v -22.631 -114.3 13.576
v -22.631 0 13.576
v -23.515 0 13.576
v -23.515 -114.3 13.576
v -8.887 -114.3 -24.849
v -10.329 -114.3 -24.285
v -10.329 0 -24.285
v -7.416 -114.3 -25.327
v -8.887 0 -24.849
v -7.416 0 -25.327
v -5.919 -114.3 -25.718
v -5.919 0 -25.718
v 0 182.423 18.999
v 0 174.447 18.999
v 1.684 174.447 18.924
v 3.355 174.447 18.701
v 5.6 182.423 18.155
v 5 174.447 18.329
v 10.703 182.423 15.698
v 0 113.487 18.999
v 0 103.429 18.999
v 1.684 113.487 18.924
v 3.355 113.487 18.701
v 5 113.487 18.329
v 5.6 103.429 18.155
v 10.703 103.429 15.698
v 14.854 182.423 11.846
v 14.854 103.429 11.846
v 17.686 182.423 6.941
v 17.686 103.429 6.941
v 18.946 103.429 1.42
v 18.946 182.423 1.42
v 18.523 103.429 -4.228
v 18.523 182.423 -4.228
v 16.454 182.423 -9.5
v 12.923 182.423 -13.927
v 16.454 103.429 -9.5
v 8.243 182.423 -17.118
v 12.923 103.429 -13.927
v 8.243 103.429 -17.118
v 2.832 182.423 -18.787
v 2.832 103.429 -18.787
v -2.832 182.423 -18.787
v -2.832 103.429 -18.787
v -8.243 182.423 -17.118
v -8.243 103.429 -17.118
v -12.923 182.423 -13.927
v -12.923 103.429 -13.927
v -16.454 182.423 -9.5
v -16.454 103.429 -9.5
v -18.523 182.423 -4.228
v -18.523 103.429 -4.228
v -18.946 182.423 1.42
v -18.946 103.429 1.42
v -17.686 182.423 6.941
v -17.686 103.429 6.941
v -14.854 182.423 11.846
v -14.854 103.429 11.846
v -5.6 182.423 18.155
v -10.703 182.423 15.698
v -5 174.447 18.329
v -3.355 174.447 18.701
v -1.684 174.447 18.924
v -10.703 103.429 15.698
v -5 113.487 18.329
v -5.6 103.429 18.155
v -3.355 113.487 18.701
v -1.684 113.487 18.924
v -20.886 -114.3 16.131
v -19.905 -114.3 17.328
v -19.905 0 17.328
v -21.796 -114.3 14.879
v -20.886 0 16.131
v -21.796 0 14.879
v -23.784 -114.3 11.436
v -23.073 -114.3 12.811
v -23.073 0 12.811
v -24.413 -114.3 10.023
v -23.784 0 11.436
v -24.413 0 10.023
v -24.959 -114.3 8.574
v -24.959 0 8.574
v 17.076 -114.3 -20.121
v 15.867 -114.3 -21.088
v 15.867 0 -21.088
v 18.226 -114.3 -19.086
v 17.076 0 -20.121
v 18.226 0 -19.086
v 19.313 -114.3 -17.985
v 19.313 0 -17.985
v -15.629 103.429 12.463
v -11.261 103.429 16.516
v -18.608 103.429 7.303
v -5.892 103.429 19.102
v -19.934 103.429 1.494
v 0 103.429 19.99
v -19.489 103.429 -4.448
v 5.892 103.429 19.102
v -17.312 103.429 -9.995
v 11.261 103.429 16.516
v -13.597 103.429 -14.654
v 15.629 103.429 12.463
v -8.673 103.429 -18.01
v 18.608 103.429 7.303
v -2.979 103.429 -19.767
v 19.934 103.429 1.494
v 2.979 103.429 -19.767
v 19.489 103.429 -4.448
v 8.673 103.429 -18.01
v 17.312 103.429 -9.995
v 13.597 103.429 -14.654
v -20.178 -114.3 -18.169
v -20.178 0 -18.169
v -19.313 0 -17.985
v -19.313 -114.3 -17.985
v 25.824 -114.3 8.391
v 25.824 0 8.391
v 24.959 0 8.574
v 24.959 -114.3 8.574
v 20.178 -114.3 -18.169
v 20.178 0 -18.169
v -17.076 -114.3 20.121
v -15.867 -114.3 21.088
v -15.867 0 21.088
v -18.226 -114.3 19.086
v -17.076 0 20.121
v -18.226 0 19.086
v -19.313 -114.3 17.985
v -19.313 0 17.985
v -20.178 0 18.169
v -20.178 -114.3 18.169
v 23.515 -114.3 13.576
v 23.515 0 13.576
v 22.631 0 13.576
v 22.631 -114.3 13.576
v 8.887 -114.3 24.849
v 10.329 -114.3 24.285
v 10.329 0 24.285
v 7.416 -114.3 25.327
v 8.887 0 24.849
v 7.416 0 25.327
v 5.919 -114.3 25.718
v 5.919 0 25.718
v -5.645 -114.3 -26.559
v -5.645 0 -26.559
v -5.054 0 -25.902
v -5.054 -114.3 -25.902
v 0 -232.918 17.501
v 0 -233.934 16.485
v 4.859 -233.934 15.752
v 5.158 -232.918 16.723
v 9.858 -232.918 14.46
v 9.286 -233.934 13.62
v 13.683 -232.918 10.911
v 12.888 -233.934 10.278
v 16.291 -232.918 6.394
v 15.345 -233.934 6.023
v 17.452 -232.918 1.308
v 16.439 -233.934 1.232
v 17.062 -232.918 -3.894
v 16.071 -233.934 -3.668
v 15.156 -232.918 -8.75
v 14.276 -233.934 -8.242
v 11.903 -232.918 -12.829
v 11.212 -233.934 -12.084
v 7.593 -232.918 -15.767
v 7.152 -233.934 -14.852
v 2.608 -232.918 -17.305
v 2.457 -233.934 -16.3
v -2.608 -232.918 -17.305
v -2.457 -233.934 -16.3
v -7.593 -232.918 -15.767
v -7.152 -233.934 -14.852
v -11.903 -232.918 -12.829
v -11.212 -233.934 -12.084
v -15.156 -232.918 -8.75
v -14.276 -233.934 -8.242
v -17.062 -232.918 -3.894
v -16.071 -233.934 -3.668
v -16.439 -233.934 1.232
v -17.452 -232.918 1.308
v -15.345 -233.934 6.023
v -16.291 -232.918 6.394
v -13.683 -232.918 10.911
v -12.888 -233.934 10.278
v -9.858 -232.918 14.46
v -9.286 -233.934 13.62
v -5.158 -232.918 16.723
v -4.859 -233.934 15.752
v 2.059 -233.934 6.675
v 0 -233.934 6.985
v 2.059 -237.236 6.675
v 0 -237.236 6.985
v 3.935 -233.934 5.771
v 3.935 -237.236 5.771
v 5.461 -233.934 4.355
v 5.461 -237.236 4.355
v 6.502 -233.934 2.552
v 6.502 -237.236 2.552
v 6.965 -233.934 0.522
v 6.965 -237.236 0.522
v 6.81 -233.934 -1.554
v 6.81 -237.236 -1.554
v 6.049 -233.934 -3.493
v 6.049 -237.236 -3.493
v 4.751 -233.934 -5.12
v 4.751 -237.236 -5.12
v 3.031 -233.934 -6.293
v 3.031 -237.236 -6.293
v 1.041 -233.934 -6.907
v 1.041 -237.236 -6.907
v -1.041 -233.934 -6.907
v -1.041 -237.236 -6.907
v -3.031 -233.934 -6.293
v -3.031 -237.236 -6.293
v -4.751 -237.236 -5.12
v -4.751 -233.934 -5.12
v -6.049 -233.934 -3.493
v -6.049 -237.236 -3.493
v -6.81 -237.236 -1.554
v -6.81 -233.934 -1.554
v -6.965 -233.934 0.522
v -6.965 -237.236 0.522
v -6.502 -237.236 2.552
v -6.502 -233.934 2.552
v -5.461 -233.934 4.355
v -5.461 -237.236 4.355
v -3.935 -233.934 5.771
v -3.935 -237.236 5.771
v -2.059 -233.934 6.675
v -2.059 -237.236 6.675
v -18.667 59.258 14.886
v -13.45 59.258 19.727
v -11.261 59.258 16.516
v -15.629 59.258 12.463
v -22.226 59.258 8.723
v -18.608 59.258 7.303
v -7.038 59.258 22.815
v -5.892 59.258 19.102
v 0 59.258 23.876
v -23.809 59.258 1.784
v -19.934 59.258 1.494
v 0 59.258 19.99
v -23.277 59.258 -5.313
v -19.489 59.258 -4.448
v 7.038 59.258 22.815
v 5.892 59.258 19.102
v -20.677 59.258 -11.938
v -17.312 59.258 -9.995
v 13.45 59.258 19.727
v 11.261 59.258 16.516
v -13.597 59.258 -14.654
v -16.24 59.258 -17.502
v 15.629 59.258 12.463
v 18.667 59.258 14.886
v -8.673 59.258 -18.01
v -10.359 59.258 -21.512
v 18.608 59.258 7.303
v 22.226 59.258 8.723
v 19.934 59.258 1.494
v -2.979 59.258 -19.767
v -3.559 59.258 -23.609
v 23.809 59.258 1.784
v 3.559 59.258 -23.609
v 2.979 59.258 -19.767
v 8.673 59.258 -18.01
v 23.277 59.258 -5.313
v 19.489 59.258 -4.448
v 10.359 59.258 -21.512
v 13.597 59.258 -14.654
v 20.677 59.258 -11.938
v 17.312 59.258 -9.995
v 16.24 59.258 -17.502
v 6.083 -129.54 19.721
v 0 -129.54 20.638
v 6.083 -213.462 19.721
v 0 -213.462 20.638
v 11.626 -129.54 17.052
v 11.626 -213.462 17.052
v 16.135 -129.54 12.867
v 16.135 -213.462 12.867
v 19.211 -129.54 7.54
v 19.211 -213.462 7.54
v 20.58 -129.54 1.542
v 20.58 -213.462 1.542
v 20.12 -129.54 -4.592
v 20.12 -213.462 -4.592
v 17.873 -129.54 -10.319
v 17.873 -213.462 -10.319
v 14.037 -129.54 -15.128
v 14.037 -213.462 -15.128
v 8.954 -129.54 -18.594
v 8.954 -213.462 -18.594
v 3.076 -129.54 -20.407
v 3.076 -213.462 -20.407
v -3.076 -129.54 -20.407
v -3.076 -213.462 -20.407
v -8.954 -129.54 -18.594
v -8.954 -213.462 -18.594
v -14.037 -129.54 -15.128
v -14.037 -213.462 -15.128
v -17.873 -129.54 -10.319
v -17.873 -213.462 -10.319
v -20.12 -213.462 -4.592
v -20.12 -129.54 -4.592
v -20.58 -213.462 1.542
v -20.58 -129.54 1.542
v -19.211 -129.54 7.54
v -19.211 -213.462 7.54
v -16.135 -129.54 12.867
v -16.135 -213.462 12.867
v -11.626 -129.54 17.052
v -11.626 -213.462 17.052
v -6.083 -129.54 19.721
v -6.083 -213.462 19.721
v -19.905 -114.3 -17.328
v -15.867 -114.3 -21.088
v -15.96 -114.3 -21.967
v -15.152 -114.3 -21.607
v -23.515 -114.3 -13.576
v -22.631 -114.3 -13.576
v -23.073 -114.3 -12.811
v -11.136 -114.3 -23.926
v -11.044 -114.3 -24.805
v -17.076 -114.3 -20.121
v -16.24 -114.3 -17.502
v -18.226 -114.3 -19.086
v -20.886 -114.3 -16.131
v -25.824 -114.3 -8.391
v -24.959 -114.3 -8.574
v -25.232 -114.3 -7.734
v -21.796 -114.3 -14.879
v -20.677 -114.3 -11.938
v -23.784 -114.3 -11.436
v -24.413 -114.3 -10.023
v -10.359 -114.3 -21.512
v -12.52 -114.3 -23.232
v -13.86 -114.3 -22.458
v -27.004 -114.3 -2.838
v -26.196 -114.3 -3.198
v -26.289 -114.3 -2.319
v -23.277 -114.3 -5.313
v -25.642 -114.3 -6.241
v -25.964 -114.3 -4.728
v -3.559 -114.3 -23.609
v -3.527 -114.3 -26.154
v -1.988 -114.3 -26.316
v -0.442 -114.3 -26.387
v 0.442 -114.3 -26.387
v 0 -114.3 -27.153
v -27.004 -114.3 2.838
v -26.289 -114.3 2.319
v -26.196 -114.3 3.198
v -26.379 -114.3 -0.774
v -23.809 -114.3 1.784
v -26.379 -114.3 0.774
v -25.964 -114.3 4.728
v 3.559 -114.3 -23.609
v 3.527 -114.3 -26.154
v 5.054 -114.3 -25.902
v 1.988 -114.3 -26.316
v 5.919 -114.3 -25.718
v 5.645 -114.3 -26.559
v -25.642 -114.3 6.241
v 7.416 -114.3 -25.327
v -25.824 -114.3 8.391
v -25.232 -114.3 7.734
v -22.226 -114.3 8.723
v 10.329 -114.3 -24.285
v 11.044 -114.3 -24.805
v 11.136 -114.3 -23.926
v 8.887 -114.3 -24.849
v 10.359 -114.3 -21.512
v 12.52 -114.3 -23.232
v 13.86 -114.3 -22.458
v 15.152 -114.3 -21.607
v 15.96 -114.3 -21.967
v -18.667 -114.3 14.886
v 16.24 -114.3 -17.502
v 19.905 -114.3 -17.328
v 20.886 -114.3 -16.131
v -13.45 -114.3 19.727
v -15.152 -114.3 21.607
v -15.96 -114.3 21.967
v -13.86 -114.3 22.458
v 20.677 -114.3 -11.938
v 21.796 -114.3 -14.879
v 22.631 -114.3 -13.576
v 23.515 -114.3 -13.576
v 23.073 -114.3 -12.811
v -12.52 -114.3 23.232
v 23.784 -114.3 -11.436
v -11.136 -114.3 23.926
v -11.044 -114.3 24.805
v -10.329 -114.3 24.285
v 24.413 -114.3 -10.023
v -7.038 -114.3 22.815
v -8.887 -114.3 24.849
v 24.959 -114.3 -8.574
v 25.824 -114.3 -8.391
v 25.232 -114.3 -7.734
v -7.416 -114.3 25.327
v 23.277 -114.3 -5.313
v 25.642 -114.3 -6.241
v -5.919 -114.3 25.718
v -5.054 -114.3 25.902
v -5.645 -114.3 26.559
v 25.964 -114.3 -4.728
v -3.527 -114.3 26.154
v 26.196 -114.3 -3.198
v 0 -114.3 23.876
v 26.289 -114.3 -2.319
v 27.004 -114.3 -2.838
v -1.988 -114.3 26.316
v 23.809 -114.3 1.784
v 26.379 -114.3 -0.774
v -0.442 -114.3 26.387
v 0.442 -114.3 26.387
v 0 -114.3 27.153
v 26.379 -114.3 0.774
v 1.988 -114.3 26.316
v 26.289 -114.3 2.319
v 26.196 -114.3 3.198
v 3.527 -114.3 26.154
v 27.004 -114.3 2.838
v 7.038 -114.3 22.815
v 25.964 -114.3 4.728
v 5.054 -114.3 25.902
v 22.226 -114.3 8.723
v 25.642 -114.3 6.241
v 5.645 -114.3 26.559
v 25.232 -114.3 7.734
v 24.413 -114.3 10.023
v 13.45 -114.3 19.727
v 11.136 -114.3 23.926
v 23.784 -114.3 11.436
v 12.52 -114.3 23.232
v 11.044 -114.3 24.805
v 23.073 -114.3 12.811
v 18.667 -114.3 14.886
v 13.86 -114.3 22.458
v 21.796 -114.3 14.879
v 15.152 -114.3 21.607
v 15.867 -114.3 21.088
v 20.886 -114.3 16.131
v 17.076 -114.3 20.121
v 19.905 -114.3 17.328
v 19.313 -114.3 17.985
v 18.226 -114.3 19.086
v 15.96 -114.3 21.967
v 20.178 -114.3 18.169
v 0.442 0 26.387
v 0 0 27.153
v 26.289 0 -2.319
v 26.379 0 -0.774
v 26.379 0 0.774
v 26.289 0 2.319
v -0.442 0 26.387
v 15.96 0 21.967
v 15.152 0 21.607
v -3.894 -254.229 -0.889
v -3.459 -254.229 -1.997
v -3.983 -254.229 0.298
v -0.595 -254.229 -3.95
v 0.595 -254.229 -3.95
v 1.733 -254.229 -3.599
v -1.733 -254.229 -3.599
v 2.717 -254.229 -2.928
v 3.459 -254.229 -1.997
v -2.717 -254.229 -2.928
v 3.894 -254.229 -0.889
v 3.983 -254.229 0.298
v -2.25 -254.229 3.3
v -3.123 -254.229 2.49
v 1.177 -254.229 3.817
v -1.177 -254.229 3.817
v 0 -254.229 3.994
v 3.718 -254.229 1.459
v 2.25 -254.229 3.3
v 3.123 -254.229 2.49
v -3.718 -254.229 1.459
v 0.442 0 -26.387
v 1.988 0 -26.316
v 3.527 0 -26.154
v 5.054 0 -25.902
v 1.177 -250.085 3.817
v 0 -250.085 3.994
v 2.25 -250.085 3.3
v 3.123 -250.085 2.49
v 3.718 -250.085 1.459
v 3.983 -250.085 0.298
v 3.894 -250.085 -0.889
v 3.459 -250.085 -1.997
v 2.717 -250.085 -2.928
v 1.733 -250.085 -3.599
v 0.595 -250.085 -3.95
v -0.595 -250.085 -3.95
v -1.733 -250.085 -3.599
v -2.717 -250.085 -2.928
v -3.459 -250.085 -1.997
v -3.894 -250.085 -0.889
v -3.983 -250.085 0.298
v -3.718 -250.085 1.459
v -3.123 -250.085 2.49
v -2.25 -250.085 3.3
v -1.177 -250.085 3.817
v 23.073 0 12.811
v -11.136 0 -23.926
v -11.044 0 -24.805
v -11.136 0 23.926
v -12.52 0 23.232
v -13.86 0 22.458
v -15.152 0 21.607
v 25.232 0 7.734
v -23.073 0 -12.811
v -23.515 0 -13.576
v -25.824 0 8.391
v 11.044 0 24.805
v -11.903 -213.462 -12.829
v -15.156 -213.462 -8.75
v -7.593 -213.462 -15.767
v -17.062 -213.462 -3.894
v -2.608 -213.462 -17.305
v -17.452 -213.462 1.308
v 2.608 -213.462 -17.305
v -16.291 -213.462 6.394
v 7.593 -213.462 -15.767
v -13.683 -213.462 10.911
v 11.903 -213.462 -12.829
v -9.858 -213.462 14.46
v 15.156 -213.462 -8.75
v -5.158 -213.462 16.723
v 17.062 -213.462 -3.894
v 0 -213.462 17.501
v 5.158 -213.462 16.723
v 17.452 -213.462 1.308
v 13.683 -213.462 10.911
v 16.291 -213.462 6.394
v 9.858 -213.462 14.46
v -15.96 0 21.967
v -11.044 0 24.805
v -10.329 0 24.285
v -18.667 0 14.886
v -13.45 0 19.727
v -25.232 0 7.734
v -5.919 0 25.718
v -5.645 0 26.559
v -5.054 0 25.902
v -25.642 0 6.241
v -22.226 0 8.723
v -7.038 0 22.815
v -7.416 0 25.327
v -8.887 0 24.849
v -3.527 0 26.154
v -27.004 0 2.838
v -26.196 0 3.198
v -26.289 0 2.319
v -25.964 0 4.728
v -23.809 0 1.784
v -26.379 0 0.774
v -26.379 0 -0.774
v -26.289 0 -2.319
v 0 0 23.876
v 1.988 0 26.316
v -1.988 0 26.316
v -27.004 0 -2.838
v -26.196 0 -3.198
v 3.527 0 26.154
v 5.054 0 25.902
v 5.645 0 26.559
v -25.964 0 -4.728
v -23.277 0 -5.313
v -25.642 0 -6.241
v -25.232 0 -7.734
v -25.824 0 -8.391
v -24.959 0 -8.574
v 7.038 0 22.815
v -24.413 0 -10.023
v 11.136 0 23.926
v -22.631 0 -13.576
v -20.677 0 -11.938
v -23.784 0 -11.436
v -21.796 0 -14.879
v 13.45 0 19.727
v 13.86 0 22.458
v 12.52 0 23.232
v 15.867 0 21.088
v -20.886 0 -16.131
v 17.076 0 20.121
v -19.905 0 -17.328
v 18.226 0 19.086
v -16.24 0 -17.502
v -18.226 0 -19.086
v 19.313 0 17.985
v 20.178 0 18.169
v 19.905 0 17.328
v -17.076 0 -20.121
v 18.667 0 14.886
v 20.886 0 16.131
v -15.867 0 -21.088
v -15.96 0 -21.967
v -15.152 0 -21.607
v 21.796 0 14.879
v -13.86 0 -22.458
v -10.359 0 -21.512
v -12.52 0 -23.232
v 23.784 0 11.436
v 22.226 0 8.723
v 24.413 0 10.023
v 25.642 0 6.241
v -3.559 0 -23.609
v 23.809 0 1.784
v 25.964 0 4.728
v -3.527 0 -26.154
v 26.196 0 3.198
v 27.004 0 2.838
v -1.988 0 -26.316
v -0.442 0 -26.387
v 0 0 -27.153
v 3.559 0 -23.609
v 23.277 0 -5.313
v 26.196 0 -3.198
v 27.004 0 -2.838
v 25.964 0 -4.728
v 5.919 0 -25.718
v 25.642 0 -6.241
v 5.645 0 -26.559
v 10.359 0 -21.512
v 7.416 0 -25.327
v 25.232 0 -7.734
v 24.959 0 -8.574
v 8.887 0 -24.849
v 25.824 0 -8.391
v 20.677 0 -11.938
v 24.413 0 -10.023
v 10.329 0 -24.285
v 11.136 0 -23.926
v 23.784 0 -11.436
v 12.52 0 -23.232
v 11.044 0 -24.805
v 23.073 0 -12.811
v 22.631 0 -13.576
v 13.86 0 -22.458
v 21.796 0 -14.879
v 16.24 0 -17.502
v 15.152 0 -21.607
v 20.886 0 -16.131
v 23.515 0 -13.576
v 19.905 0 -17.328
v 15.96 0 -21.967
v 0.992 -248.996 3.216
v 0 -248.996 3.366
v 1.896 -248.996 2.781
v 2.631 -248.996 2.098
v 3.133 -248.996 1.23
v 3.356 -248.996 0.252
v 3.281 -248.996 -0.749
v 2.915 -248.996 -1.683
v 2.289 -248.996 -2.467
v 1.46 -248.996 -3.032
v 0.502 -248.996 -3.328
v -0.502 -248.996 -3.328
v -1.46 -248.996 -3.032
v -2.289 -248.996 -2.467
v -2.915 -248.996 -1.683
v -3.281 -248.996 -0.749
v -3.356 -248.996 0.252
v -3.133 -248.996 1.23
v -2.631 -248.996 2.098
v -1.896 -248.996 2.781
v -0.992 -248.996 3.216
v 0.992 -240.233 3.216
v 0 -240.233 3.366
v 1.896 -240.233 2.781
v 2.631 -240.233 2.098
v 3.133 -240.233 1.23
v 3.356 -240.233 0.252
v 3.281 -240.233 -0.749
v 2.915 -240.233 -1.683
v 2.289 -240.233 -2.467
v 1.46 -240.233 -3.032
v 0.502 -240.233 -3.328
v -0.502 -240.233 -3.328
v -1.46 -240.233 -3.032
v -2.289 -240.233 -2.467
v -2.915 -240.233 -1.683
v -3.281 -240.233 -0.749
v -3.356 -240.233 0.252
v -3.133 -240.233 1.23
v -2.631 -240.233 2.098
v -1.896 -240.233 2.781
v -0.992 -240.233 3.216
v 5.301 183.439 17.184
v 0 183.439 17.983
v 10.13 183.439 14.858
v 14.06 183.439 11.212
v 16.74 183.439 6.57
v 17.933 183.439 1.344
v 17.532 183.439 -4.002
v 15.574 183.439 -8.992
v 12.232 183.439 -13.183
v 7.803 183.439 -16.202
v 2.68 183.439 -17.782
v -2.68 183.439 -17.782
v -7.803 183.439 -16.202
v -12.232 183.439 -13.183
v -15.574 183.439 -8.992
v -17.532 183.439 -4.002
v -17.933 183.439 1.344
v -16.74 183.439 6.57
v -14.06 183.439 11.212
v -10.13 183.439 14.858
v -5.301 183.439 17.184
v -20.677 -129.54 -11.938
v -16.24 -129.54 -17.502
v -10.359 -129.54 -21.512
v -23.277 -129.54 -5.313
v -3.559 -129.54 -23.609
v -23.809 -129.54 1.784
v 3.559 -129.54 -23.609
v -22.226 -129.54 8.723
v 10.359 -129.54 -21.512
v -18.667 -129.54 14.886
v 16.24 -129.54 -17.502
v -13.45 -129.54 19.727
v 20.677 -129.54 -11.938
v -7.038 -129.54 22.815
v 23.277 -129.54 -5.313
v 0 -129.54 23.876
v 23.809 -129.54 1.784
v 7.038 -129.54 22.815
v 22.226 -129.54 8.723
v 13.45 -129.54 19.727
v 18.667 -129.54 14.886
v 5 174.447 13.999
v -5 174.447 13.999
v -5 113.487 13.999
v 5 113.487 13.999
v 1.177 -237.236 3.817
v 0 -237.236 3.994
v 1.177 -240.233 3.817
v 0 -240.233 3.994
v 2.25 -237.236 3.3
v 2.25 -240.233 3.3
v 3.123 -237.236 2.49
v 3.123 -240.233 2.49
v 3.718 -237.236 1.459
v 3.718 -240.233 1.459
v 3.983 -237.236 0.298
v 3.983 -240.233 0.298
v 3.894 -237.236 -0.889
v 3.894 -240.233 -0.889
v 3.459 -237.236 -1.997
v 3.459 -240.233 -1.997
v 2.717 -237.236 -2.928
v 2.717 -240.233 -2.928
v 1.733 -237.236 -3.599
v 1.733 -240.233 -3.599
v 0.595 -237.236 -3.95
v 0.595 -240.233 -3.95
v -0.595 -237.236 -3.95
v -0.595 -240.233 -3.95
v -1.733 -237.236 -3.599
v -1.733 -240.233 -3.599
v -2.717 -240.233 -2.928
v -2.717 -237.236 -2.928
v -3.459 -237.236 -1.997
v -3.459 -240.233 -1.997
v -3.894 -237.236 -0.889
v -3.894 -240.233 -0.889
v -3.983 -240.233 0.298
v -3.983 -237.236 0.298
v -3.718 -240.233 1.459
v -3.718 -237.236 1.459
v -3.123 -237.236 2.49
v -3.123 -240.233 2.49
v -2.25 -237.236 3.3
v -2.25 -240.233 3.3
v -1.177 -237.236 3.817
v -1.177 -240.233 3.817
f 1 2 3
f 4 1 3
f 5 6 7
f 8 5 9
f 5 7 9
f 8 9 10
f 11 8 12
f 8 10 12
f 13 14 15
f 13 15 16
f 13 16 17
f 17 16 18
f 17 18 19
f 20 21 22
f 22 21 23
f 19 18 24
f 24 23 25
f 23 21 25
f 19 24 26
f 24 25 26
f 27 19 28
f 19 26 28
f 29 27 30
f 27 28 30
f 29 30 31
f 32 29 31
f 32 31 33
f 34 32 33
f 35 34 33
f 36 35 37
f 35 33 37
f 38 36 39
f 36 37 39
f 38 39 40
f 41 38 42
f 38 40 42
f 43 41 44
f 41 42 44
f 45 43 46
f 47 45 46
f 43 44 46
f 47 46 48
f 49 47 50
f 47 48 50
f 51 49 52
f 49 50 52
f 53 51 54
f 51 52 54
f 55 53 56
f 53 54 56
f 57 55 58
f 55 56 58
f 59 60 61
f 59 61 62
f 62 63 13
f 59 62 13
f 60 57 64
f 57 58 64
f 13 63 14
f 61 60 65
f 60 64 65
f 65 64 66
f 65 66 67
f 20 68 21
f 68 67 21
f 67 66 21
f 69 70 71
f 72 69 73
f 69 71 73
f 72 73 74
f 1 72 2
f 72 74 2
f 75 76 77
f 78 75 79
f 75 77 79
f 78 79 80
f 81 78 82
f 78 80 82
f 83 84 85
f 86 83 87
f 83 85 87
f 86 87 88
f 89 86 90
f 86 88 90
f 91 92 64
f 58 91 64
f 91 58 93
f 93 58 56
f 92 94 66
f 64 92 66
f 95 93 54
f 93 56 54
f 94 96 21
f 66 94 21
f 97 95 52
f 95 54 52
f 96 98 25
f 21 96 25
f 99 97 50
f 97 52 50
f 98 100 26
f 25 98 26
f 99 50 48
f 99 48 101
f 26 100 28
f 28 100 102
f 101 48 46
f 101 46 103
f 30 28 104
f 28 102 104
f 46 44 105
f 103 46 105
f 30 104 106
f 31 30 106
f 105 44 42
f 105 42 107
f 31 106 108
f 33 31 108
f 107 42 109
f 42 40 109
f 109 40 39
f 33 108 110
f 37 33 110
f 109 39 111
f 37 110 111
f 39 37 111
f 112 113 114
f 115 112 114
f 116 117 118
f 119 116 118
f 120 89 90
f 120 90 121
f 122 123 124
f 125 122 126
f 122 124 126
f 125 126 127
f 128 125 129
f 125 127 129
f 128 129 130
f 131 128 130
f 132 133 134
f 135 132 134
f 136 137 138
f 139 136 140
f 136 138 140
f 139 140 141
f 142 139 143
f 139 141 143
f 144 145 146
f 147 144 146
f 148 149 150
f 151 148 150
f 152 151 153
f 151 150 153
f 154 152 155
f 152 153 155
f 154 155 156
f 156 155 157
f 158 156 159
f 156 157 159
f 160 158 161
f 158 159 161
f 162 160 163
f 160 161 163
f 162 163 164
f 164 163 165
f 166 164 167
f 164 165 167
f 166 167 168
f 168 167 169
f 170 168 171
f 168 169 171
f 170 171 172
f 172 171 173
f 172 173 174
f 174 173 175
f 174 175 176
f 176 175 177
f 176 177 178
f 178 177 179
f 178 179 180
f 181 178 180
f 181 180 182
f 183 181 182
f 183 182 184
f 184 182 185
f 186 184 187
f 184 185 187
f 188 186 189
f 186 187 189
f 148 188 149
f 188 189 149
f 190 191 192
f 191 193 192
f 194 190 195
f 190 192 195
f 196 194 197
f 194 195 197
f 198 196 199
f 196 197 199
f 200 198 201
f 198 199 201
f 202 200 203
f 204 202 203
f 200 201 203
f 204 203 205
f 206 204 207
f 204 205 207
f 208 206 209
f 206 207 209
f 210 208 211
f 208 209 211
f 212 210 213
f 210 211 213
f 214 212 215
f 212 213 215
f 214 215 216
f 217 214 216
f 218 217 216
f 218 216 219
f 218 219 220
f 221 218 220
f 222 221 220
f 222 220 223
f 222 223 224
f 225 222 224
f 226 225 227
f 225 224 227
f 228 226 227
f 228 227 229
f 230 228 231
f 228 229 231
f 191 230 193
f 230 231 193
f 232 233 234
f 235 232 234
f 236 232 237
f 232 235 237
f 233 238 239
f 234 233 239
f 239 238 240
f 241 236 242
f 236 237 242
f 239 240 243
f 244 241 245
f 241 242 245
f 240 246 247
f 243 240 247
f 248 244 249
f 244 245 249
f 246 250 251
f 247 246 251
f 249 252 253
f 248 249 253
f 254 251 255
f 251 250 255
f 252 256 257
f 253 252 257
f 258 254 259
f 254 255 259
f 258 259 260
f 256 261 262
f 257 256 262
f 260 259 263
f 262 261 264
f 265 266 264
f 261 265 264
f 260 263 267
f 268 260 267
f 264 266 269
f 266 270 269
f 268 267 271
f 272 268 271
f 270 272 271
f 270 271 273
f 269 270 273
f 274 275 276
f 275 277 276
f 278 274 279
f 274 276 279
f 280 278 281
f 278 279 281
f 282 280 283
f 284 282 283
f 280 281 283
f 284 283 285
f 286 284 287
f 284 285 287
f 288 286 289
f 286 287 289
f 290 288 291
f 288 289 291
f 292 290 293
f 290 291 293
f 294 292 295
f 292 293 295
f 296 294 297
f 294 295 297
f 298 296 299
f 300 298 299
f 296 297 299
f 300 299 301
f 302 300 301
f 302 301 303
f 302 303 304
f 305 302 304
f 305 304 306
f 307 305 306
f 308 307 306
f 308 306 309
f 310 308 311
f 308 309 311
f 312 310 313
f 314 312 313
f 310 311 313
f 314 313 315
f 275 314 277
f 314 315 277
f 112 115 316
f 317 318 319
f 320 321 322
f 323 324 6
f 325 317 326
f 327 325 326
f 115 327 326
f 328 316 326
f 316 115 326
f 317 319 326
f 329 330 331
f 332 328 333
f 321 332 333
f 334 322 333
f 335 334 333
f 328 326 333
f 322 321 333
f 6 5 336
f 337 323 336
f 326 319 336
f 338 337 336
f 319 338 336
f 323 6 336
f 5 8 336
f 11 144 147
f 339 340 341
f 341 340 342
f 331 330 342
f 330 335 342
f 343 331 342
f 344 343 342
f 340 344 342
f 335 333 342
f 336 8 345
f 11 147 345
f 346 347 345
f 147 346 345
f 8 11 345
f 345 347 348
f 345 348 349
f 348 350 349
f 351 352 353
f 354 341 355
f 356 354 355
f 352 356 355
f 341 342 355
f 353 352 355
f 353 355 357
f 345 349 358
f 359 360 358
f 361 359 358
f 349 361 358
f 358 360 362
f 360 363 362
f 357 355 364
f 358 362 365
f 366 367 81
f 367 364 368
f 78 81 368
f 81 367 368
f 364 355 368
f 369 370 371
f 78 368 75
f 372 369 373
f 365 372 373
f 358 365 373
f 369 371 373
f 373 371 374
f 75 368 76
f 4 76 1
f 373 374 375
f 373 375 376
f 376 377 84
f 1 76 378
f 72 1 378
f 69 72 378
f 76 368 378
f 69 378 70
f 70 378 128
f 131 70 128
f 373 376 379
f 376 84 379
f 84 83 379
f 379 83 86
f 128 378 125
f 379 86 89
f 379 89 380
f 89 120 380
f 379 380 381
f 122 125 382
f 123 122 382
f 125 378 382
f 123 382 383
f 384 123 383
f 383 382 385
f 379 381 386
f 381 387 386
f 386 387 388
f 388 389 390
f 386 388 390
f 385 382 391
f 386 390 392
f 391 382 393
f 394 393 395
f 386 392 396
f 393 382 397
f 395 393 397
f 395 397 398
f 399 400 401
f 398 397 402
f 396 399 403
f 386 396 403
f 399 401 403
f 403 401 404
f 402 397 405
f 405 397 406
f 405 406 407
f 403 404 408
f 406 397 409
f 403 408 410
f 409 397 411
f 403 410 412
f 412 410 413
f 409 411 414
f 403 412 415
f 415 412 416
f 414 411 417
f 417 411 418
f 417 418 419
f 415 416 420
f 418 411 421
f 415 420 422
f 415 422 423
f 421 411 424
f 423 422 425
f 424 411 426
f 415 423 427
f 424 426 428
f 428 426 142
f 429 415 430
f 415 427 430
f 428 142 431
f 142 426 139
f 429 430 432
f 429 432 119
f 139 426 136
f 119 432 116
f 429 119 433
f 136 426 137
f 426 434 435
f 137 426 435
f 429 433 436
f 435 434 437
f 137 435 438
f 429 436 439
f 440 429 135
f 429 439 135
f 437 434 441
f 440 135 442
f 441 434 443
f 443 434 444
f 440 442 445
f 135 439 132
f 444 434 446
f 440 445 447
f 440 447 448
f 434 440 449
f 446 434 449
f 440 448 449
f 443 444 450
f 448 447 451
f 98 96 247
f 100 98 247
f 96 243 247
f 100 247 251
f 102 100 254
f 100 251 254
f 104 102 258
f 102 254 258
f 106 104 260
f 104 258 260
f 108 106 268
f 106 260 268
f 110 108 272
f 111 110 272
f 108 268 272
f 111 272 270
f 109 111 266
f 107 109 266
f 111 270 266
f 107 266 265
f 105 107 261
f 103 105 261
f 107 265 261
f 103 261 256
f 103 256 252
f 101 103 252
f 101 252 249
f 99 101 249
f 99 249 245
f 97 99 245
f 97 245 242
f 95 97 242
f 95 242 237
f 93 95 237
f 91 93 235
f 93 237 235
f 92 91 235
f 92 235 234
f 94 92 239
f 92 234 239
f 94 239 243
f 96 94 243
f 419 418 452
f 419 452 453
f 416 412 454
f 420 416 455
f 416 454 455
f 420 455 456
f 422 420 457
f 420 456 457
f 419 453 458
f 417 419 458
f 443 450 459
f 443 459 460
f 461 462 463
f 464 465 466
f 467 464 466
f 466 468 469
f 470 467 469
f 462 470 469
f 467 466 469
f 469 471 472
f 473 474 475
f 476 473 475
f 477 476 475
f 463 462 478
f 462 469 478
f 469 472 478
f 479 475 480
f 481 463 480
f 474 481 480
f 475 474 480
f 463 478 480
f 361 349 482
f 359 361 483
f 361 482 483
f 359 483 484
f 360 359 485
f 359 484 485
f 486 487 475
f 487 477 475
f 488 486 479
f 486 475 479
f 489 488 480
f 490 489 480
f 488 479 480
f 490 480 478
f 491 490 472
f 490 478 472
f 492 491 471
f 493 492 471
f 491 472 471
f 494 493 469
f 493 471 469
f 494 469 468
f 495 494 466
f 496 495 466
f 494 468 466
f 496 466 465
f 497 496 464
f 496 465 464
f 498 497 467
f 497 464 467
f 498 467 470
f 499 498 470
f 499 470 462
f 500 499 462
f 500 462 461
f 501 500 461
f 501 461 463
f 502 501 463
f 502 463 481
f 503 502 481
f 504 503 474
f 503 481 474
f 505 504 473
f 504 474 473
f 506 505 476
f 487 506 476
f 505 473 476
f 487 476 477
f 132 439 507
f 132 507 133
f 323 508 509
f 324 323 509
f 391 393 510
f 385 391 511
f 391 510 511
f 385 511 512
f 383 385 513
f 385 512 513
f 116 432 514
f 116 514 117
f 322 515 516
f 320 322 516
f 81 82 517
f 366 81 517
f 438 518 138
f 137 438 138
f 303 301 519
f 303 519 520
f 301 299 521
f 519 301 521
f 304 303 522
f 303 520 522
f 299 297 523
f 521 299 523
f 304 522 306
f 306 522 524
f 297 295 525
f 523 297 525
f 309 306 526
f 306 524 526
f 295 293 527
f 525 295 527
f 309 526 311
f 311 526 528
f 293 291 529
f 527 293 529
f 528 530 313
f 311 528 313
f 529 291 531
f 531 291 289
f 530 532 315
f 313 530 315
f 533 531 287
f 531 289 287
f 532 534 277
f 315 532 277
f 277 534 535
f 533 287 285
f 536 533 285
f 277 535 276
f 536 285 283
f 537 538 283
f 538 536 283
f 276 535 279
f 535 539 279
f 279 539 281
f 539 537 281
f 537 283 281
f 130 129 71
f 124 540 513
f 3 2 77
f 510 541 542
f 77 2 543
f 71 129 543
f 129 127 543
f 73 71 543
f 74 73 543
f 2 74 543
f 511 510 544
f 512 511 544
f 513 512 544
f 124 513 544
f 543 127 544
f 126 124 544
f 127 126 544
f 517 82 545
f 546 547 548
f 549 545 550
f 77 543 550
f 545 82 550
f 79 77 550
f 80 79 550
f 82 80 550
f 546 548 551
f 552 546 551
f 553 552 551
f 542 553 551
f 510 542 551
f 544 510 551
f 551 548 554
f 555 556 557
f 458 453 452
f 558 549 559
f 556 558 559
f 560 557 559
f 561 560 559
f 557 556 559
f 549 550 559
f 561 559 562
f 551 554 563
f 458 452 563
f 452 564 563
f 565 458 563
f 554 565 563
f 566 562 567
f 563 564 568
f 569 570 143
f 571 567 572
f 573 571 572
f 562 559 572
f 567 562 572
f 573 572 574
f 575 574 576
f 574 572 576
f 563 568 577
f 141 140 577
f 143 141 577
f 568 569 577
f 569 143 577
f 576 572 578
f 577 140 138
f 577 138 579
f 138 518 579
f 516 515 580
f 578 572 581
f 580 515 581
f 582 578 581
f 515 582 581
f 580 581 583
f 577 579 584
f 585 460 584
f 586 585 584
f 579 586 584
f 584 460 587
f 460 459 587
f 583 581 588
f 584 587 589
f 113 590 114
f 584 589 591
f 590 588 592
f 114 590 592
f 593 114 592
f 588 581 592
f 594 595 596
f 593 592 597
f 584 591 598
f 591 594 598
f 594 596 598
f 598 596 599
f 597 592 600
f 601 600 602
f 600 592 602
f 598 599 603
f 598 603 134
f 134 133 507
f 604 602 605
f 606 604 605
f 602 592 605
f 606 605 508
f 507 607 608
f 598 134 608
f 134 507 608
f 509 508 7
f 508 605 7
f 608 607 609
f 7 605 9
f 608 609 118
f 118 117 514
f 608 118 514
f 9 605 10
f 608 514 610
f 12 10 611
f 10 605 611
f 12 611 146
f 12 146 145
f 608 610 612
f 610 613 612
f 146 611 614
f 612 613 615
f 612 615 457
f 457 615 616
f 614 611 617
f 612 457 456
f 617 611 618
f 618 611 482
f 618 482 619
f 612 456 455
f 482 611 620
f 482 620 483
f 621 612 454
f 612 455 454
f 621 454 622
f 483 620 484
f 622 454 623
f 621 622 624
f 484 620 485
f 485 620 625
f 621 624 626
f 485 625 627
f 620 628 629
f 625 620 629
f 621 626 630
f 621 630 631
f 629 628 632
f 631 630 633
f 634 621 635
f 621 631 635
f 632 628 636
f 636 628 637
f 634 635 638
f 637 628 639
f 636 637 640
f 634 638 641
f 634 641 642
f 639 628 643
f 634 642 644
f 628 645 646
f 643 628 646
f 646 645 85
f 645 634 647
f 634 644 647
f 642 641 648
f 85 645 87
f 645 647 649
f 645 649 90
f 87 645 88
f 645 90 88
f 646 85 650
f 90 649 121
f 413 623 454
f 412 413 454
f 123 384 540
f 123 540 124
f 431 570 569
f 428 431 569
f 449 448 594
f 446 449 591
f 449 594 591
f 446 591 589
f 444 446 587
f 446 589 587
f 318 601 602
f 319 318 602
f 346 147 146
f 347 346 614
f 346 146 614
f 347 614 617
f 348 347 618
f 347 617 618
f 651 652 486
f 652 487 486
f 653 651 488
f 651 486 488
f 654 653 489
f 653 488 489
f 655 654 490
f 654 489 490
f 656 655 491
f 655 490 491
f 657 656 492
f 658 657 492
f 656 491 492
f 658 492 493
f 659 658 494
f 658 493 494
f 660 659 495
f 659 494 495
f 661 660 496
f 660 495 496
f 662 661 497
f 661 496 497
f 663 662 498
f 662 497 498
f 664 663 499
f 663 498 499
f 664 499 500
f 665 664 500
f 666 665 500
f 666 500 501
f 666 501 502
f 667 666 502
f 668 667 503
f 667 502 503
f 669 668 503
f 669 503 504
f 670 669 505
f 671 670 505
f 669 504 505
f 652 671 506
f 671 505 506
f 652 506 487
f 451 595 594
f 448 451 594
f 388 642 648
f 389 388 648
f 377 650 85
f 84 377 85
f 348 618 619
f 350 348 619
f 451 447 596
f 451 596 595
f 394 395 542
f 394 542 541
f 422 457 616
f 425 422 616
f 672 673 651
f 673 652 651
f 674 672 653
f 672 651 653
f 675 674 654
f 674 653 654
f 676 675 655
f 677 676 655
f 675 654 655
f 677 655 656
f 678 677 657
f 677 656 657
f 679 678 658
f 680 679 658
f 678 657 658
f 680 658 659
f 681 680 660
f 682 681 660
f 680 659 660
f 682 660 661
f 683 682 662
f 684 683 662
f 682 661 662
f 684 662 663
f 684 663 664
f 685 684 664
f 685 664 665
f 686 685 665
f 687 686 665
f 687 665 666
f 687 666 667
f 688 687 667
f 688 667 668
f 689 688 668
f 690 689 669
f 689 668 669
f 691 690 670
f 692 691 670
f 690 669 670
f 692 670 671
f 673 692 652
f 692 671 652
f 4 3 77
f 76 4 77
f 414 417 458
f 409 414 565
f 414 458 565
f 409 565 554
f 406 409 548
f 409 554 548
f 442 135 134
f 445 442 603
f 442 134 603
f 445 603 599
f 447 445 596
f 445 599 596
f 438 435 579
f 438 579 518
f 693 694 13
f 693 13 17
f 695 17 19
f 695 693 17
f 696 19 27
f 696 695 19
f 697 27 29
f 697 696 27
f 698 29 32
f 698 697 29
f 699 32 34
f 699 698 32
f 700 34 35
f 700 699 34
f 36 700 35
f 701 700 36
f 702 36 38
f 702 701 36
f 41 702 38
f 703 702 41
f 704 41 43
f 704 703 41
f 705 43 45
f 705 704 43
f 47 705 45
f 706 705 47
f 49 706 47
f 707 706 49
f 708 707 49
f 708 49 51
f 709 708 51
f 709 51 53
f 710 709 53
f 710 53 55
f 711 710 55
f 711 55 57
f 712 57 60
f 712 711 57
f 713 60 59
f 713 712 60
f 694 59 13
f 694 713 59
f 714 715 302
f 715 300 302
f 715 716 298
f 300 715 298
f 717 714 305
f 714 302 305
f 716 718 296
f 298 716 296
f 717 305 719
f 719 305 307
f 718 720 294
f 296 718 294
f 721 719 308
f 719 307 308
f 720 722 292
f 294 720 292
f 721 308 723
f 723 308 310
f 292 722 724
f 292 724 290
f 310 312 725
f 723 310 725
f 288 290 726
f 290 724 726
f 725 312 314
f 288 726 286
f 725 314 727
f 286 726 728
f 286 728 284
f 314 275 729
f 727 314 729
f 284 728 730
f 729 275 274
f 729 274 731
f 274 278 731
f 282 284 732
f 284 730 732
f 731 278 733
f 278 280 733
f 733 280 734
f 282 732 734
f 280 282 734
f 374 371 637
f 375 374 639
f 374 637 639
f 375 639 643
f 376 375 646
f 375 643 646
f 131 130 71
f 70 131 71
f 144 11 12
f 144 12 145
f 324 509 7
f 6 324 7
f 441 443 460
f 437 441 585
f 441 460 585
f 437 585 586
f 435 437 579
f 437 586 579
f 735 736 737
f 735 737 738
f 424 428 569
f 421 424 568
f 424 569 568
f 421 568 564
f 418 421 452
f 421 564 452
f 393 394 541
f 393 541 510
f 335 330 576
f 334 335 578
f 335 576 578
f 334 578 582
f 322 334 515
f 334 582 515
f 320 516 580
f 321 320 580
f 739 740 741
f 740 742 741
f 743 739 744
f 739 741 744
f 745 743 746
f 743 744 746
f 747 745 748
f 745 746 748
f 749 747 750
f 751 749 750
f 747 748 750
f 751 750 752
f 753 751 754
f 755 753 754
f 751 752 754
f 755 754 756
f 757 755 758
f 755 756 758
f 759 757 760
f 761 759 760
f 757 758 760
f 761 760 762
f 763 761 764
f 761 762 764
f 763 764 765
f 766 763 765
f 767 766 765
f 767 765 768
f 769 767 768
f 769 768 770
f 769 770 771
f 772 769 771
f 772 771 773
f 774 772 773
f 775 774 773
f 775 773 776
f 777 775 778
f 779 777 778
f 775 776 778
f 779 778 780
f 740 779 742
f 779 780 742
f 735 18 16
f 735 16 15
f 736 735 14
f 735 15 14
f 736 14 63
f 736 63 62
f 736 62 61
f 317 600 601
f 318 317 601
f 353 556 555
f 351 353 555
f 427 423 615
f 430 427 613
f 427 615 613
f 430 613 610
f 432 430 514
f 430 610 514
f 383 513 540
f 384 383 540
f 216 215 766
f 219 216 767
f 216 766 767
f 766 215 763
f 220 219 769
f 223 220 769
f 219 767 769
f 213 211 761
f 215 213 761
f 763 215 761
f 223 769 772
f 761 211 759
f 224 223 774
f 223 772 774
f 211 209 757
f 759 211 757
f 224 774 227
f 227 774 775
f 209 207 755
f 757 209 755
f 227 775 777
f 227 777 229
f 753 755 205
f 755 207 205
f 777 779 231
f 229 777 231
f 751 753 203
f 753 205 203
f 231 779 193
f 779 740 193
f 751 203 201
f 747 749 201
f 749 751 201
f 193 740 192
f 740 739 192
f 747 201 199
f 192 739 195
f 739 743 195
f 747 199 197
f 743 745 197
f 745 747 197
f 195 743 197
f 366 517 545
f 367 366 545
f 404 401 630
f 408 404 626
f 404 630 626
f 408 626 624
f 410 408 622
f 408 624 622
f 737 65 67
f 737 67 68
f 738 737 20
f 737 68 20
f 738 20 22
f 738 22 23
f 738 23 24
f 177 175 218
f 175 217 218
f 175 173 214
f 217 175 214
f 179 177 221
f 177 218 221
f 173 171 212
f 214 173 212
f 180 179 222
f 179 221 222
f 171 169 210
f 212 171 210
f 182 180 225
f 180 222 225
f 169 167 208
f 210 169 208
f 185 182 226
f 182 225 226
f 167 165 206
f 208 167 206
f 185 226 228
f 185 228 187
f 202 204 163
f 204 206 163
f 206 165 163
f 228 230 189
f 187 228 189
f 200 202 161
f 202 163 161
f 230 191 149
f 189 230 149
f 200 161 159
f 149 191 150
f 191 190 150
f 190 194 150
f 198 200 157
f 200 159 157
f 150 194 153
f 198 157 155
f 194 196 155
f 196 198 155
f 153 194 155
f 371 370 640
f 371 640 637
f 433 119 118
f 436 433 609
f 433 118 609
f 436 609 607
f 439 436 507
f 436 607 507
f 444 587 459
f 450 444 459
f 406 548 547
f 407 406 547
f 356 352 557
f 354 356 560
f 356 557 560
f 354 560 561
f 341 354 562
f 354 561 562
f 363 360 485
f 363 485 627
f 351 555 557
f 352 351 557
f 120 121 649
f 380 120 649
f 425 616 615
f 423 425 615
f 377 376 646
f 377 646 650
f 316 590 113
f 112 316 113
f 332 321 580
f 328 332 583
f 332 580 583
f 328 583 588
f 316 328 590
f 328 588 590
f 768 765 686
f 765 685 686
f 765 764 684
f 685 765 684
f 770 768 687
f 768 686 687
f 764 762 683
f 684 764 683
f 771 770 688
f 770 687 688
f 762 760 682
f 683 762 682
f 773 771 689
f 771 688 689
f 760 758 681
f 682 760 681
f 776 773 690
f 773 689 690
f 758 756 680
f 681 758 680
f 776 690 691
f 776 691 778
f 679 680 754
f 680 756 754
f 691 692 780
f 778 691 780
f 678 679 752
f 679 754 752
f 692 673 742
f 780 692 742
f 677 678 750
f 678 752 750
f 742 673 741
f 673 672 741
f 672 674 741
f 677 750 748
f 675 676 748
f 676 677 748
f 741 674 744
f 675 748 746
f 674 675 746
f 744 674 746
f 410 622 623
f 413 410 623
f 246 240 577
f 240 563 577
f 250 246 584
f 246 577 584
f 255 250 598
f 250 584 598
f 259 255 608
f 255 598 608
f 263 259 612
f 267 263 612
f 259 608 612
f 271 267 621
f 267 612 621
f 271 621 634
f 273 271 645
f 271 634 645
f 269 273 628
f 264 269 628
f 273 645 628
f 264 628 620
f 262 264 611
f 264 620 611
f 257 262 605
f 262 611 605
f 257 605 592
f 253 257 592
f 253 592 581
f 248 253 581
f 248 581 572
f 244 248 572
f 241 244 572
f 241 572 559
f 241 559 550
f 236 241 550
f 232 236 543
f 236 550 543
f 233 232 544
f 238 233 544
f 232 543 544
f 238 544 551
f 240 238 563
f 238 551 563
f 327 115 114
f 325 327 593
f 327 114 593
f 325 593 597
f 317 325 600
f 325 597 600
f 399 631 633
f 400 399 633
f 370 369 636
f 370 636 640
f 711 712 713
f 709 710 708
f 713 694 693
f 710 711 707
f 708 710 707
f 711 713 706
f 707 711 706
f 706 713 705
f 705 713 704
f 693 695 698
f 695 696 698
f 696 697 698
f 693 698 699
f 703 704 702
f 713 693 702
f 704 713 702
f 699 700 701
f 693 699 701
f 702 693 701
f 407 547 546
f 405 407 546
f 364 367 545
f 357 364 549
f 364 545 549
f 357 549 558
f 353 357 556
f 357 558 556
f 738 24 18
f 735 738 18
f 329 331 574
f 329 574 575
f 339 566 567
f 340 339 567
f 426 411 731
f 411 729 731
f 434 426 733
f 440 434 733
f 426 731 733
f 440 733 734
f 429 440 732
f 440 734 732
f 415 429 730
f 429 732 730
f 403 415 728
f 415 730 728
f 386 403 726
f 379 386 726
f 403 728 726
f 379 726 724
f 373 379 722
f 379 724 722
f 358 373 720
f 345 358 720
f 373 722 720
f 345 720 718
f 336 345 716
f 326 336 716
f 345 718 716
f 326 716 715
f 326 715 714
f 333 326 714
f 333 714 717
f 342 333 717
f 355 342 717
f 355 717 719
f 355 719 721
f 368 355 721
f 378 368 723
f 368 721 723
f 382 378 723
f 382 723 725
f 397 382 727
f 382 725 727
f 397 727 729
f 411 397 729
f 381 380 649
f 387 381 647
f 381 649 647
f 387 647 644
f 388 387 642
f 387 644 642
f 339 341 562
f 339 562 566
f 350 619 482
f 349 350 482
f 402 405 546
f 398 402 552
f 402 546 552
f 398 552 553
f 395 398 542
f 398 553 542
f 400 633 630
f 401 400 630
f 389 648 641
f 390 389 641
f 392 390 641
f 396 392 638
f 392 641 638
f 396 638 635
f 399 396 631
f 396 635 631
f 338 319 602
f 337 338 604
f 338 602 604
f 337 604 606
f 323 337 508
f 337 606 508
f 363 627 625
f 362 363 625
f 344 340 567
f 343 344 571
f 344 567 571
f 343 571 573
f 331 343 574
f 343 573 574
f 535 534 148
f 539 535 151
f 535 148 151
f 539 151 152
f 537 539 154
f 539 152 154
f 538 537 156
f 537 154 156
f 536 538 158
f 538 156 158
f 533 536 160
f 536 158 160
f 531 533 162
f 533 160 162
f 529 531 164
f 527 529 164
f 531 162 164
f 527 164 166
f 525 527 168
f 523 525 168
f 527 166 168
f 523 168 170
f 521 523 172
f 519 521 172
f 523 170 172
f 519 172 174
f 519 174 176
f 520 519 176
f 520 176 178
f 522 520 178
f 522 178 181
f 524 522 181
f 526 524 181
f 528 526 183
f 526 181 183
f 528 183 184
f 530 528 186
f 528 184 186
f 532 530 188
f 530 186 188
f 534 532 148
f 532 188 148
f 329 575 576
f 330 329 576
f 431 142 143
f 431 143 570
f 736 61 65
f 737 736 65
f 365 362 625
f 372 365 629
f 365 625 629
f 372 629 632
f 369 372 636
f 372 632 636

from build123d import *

# Parameters (mm, degrees)
F3_DEPTH        = 254.2296
F3_COPIES_COUNT = 30
F6_DEPTH        = 5
F7_SIZE         = 1.016


# Not quite as in the source:
# - a pattern or mirror of a feature is missing from the dataset's text; its kind, count and spacing are read off the source's solid


with BuildPart() as f1:
    # F0 (on Right) → F1 (revolve)
    with BuildSketch(Plane.YZ):
        Polygon((59.2582, 23.876), (0, 23.876), (0, 27.1526), (-114.3, 27.1526), (-114.3, 23.876), (-129.54, 23.876), (-129.54, 20.6375), (-213.4616, 20.6375), (-213.4616, 17.5006), (-233.934, 17.5006), (-233.934, 6.985), (-237.236, 6.985), (-237.236, 3.99415), (-240.2332, 3.99415), (-240.2332, 3.3655), (-248.9962, 3.3655), (-250.0850537402, 3.99415), (-254.2286, 3.99415), (-254.2286, 0), (-233.934, 0), (183.4388, 0), (183.4388, 18.9992), (103.4288, 18.9992), (103.4288, 19.9898), (59.2582, 19.9898), align=None)
    revolve(axis=Axis((0, -25.2476, 0), (0, 1, 0)))

    # F2 (on face) → F3 (cut, through all)
    with BuildSketch(Plane(origin=(0, 0, 0), x_dir=(-1, 0, 0), z_dir=(0, 1, 0))):
        with BuildLine():
            Line((-0.442078818, 26.3868970263), (0, 27.1526))
            ThreePointArc((0, 27.1526), (-2.8382195517, 27.0038552162), (-5.6453429761, 26.5592505437))
            Line((-5.6453429761, 26.5592505437), (-5.0537260411, 25.9021933716))
            ThreePointArc((-5.0537260411, 25.9021933716), (-2.7585688627, 26.2460295319), (-0.442078818, 26.3868970263))
        make_face()
    f3 = extrude(amount=-F3_DEPTH, mode=Mode.SUBTRACT)

    # F3_copies: F3 ×30 about axis
    f3_copies_axis = Axis((0, 0, 0), (0, 1, 0))
    for i in range(1, F3_COPIES_COUNT):
        add(f3.rotate(f3_copies_axis, i * 360 / F3_COPIES_COUNT), mode=Mode.SUBTRACT)

    # F5 (on offset) → F6 (cut)
    with BuildSketch(Plane.XY.offset(18.9992)):
        Polygon((-4.99999, 174.4472), (-4.99999, 113.4872), (4.99999, 113.4872), (4.99999, 174.4472), (0, 174.4472), align=None)
    extrude(amount=-F6_DEPTH, mode=Mode.SUBTRACT)

    # F7
    f7_edges = [f1.edges().sort_by_distance(p)[0] for p in [
        (0, 183.4388, -18.9992),
        (0, -233.934, -17.5006),
    ]]
    chamfer(f7_edges, length=F7_SIZE)


solid = f1.part
